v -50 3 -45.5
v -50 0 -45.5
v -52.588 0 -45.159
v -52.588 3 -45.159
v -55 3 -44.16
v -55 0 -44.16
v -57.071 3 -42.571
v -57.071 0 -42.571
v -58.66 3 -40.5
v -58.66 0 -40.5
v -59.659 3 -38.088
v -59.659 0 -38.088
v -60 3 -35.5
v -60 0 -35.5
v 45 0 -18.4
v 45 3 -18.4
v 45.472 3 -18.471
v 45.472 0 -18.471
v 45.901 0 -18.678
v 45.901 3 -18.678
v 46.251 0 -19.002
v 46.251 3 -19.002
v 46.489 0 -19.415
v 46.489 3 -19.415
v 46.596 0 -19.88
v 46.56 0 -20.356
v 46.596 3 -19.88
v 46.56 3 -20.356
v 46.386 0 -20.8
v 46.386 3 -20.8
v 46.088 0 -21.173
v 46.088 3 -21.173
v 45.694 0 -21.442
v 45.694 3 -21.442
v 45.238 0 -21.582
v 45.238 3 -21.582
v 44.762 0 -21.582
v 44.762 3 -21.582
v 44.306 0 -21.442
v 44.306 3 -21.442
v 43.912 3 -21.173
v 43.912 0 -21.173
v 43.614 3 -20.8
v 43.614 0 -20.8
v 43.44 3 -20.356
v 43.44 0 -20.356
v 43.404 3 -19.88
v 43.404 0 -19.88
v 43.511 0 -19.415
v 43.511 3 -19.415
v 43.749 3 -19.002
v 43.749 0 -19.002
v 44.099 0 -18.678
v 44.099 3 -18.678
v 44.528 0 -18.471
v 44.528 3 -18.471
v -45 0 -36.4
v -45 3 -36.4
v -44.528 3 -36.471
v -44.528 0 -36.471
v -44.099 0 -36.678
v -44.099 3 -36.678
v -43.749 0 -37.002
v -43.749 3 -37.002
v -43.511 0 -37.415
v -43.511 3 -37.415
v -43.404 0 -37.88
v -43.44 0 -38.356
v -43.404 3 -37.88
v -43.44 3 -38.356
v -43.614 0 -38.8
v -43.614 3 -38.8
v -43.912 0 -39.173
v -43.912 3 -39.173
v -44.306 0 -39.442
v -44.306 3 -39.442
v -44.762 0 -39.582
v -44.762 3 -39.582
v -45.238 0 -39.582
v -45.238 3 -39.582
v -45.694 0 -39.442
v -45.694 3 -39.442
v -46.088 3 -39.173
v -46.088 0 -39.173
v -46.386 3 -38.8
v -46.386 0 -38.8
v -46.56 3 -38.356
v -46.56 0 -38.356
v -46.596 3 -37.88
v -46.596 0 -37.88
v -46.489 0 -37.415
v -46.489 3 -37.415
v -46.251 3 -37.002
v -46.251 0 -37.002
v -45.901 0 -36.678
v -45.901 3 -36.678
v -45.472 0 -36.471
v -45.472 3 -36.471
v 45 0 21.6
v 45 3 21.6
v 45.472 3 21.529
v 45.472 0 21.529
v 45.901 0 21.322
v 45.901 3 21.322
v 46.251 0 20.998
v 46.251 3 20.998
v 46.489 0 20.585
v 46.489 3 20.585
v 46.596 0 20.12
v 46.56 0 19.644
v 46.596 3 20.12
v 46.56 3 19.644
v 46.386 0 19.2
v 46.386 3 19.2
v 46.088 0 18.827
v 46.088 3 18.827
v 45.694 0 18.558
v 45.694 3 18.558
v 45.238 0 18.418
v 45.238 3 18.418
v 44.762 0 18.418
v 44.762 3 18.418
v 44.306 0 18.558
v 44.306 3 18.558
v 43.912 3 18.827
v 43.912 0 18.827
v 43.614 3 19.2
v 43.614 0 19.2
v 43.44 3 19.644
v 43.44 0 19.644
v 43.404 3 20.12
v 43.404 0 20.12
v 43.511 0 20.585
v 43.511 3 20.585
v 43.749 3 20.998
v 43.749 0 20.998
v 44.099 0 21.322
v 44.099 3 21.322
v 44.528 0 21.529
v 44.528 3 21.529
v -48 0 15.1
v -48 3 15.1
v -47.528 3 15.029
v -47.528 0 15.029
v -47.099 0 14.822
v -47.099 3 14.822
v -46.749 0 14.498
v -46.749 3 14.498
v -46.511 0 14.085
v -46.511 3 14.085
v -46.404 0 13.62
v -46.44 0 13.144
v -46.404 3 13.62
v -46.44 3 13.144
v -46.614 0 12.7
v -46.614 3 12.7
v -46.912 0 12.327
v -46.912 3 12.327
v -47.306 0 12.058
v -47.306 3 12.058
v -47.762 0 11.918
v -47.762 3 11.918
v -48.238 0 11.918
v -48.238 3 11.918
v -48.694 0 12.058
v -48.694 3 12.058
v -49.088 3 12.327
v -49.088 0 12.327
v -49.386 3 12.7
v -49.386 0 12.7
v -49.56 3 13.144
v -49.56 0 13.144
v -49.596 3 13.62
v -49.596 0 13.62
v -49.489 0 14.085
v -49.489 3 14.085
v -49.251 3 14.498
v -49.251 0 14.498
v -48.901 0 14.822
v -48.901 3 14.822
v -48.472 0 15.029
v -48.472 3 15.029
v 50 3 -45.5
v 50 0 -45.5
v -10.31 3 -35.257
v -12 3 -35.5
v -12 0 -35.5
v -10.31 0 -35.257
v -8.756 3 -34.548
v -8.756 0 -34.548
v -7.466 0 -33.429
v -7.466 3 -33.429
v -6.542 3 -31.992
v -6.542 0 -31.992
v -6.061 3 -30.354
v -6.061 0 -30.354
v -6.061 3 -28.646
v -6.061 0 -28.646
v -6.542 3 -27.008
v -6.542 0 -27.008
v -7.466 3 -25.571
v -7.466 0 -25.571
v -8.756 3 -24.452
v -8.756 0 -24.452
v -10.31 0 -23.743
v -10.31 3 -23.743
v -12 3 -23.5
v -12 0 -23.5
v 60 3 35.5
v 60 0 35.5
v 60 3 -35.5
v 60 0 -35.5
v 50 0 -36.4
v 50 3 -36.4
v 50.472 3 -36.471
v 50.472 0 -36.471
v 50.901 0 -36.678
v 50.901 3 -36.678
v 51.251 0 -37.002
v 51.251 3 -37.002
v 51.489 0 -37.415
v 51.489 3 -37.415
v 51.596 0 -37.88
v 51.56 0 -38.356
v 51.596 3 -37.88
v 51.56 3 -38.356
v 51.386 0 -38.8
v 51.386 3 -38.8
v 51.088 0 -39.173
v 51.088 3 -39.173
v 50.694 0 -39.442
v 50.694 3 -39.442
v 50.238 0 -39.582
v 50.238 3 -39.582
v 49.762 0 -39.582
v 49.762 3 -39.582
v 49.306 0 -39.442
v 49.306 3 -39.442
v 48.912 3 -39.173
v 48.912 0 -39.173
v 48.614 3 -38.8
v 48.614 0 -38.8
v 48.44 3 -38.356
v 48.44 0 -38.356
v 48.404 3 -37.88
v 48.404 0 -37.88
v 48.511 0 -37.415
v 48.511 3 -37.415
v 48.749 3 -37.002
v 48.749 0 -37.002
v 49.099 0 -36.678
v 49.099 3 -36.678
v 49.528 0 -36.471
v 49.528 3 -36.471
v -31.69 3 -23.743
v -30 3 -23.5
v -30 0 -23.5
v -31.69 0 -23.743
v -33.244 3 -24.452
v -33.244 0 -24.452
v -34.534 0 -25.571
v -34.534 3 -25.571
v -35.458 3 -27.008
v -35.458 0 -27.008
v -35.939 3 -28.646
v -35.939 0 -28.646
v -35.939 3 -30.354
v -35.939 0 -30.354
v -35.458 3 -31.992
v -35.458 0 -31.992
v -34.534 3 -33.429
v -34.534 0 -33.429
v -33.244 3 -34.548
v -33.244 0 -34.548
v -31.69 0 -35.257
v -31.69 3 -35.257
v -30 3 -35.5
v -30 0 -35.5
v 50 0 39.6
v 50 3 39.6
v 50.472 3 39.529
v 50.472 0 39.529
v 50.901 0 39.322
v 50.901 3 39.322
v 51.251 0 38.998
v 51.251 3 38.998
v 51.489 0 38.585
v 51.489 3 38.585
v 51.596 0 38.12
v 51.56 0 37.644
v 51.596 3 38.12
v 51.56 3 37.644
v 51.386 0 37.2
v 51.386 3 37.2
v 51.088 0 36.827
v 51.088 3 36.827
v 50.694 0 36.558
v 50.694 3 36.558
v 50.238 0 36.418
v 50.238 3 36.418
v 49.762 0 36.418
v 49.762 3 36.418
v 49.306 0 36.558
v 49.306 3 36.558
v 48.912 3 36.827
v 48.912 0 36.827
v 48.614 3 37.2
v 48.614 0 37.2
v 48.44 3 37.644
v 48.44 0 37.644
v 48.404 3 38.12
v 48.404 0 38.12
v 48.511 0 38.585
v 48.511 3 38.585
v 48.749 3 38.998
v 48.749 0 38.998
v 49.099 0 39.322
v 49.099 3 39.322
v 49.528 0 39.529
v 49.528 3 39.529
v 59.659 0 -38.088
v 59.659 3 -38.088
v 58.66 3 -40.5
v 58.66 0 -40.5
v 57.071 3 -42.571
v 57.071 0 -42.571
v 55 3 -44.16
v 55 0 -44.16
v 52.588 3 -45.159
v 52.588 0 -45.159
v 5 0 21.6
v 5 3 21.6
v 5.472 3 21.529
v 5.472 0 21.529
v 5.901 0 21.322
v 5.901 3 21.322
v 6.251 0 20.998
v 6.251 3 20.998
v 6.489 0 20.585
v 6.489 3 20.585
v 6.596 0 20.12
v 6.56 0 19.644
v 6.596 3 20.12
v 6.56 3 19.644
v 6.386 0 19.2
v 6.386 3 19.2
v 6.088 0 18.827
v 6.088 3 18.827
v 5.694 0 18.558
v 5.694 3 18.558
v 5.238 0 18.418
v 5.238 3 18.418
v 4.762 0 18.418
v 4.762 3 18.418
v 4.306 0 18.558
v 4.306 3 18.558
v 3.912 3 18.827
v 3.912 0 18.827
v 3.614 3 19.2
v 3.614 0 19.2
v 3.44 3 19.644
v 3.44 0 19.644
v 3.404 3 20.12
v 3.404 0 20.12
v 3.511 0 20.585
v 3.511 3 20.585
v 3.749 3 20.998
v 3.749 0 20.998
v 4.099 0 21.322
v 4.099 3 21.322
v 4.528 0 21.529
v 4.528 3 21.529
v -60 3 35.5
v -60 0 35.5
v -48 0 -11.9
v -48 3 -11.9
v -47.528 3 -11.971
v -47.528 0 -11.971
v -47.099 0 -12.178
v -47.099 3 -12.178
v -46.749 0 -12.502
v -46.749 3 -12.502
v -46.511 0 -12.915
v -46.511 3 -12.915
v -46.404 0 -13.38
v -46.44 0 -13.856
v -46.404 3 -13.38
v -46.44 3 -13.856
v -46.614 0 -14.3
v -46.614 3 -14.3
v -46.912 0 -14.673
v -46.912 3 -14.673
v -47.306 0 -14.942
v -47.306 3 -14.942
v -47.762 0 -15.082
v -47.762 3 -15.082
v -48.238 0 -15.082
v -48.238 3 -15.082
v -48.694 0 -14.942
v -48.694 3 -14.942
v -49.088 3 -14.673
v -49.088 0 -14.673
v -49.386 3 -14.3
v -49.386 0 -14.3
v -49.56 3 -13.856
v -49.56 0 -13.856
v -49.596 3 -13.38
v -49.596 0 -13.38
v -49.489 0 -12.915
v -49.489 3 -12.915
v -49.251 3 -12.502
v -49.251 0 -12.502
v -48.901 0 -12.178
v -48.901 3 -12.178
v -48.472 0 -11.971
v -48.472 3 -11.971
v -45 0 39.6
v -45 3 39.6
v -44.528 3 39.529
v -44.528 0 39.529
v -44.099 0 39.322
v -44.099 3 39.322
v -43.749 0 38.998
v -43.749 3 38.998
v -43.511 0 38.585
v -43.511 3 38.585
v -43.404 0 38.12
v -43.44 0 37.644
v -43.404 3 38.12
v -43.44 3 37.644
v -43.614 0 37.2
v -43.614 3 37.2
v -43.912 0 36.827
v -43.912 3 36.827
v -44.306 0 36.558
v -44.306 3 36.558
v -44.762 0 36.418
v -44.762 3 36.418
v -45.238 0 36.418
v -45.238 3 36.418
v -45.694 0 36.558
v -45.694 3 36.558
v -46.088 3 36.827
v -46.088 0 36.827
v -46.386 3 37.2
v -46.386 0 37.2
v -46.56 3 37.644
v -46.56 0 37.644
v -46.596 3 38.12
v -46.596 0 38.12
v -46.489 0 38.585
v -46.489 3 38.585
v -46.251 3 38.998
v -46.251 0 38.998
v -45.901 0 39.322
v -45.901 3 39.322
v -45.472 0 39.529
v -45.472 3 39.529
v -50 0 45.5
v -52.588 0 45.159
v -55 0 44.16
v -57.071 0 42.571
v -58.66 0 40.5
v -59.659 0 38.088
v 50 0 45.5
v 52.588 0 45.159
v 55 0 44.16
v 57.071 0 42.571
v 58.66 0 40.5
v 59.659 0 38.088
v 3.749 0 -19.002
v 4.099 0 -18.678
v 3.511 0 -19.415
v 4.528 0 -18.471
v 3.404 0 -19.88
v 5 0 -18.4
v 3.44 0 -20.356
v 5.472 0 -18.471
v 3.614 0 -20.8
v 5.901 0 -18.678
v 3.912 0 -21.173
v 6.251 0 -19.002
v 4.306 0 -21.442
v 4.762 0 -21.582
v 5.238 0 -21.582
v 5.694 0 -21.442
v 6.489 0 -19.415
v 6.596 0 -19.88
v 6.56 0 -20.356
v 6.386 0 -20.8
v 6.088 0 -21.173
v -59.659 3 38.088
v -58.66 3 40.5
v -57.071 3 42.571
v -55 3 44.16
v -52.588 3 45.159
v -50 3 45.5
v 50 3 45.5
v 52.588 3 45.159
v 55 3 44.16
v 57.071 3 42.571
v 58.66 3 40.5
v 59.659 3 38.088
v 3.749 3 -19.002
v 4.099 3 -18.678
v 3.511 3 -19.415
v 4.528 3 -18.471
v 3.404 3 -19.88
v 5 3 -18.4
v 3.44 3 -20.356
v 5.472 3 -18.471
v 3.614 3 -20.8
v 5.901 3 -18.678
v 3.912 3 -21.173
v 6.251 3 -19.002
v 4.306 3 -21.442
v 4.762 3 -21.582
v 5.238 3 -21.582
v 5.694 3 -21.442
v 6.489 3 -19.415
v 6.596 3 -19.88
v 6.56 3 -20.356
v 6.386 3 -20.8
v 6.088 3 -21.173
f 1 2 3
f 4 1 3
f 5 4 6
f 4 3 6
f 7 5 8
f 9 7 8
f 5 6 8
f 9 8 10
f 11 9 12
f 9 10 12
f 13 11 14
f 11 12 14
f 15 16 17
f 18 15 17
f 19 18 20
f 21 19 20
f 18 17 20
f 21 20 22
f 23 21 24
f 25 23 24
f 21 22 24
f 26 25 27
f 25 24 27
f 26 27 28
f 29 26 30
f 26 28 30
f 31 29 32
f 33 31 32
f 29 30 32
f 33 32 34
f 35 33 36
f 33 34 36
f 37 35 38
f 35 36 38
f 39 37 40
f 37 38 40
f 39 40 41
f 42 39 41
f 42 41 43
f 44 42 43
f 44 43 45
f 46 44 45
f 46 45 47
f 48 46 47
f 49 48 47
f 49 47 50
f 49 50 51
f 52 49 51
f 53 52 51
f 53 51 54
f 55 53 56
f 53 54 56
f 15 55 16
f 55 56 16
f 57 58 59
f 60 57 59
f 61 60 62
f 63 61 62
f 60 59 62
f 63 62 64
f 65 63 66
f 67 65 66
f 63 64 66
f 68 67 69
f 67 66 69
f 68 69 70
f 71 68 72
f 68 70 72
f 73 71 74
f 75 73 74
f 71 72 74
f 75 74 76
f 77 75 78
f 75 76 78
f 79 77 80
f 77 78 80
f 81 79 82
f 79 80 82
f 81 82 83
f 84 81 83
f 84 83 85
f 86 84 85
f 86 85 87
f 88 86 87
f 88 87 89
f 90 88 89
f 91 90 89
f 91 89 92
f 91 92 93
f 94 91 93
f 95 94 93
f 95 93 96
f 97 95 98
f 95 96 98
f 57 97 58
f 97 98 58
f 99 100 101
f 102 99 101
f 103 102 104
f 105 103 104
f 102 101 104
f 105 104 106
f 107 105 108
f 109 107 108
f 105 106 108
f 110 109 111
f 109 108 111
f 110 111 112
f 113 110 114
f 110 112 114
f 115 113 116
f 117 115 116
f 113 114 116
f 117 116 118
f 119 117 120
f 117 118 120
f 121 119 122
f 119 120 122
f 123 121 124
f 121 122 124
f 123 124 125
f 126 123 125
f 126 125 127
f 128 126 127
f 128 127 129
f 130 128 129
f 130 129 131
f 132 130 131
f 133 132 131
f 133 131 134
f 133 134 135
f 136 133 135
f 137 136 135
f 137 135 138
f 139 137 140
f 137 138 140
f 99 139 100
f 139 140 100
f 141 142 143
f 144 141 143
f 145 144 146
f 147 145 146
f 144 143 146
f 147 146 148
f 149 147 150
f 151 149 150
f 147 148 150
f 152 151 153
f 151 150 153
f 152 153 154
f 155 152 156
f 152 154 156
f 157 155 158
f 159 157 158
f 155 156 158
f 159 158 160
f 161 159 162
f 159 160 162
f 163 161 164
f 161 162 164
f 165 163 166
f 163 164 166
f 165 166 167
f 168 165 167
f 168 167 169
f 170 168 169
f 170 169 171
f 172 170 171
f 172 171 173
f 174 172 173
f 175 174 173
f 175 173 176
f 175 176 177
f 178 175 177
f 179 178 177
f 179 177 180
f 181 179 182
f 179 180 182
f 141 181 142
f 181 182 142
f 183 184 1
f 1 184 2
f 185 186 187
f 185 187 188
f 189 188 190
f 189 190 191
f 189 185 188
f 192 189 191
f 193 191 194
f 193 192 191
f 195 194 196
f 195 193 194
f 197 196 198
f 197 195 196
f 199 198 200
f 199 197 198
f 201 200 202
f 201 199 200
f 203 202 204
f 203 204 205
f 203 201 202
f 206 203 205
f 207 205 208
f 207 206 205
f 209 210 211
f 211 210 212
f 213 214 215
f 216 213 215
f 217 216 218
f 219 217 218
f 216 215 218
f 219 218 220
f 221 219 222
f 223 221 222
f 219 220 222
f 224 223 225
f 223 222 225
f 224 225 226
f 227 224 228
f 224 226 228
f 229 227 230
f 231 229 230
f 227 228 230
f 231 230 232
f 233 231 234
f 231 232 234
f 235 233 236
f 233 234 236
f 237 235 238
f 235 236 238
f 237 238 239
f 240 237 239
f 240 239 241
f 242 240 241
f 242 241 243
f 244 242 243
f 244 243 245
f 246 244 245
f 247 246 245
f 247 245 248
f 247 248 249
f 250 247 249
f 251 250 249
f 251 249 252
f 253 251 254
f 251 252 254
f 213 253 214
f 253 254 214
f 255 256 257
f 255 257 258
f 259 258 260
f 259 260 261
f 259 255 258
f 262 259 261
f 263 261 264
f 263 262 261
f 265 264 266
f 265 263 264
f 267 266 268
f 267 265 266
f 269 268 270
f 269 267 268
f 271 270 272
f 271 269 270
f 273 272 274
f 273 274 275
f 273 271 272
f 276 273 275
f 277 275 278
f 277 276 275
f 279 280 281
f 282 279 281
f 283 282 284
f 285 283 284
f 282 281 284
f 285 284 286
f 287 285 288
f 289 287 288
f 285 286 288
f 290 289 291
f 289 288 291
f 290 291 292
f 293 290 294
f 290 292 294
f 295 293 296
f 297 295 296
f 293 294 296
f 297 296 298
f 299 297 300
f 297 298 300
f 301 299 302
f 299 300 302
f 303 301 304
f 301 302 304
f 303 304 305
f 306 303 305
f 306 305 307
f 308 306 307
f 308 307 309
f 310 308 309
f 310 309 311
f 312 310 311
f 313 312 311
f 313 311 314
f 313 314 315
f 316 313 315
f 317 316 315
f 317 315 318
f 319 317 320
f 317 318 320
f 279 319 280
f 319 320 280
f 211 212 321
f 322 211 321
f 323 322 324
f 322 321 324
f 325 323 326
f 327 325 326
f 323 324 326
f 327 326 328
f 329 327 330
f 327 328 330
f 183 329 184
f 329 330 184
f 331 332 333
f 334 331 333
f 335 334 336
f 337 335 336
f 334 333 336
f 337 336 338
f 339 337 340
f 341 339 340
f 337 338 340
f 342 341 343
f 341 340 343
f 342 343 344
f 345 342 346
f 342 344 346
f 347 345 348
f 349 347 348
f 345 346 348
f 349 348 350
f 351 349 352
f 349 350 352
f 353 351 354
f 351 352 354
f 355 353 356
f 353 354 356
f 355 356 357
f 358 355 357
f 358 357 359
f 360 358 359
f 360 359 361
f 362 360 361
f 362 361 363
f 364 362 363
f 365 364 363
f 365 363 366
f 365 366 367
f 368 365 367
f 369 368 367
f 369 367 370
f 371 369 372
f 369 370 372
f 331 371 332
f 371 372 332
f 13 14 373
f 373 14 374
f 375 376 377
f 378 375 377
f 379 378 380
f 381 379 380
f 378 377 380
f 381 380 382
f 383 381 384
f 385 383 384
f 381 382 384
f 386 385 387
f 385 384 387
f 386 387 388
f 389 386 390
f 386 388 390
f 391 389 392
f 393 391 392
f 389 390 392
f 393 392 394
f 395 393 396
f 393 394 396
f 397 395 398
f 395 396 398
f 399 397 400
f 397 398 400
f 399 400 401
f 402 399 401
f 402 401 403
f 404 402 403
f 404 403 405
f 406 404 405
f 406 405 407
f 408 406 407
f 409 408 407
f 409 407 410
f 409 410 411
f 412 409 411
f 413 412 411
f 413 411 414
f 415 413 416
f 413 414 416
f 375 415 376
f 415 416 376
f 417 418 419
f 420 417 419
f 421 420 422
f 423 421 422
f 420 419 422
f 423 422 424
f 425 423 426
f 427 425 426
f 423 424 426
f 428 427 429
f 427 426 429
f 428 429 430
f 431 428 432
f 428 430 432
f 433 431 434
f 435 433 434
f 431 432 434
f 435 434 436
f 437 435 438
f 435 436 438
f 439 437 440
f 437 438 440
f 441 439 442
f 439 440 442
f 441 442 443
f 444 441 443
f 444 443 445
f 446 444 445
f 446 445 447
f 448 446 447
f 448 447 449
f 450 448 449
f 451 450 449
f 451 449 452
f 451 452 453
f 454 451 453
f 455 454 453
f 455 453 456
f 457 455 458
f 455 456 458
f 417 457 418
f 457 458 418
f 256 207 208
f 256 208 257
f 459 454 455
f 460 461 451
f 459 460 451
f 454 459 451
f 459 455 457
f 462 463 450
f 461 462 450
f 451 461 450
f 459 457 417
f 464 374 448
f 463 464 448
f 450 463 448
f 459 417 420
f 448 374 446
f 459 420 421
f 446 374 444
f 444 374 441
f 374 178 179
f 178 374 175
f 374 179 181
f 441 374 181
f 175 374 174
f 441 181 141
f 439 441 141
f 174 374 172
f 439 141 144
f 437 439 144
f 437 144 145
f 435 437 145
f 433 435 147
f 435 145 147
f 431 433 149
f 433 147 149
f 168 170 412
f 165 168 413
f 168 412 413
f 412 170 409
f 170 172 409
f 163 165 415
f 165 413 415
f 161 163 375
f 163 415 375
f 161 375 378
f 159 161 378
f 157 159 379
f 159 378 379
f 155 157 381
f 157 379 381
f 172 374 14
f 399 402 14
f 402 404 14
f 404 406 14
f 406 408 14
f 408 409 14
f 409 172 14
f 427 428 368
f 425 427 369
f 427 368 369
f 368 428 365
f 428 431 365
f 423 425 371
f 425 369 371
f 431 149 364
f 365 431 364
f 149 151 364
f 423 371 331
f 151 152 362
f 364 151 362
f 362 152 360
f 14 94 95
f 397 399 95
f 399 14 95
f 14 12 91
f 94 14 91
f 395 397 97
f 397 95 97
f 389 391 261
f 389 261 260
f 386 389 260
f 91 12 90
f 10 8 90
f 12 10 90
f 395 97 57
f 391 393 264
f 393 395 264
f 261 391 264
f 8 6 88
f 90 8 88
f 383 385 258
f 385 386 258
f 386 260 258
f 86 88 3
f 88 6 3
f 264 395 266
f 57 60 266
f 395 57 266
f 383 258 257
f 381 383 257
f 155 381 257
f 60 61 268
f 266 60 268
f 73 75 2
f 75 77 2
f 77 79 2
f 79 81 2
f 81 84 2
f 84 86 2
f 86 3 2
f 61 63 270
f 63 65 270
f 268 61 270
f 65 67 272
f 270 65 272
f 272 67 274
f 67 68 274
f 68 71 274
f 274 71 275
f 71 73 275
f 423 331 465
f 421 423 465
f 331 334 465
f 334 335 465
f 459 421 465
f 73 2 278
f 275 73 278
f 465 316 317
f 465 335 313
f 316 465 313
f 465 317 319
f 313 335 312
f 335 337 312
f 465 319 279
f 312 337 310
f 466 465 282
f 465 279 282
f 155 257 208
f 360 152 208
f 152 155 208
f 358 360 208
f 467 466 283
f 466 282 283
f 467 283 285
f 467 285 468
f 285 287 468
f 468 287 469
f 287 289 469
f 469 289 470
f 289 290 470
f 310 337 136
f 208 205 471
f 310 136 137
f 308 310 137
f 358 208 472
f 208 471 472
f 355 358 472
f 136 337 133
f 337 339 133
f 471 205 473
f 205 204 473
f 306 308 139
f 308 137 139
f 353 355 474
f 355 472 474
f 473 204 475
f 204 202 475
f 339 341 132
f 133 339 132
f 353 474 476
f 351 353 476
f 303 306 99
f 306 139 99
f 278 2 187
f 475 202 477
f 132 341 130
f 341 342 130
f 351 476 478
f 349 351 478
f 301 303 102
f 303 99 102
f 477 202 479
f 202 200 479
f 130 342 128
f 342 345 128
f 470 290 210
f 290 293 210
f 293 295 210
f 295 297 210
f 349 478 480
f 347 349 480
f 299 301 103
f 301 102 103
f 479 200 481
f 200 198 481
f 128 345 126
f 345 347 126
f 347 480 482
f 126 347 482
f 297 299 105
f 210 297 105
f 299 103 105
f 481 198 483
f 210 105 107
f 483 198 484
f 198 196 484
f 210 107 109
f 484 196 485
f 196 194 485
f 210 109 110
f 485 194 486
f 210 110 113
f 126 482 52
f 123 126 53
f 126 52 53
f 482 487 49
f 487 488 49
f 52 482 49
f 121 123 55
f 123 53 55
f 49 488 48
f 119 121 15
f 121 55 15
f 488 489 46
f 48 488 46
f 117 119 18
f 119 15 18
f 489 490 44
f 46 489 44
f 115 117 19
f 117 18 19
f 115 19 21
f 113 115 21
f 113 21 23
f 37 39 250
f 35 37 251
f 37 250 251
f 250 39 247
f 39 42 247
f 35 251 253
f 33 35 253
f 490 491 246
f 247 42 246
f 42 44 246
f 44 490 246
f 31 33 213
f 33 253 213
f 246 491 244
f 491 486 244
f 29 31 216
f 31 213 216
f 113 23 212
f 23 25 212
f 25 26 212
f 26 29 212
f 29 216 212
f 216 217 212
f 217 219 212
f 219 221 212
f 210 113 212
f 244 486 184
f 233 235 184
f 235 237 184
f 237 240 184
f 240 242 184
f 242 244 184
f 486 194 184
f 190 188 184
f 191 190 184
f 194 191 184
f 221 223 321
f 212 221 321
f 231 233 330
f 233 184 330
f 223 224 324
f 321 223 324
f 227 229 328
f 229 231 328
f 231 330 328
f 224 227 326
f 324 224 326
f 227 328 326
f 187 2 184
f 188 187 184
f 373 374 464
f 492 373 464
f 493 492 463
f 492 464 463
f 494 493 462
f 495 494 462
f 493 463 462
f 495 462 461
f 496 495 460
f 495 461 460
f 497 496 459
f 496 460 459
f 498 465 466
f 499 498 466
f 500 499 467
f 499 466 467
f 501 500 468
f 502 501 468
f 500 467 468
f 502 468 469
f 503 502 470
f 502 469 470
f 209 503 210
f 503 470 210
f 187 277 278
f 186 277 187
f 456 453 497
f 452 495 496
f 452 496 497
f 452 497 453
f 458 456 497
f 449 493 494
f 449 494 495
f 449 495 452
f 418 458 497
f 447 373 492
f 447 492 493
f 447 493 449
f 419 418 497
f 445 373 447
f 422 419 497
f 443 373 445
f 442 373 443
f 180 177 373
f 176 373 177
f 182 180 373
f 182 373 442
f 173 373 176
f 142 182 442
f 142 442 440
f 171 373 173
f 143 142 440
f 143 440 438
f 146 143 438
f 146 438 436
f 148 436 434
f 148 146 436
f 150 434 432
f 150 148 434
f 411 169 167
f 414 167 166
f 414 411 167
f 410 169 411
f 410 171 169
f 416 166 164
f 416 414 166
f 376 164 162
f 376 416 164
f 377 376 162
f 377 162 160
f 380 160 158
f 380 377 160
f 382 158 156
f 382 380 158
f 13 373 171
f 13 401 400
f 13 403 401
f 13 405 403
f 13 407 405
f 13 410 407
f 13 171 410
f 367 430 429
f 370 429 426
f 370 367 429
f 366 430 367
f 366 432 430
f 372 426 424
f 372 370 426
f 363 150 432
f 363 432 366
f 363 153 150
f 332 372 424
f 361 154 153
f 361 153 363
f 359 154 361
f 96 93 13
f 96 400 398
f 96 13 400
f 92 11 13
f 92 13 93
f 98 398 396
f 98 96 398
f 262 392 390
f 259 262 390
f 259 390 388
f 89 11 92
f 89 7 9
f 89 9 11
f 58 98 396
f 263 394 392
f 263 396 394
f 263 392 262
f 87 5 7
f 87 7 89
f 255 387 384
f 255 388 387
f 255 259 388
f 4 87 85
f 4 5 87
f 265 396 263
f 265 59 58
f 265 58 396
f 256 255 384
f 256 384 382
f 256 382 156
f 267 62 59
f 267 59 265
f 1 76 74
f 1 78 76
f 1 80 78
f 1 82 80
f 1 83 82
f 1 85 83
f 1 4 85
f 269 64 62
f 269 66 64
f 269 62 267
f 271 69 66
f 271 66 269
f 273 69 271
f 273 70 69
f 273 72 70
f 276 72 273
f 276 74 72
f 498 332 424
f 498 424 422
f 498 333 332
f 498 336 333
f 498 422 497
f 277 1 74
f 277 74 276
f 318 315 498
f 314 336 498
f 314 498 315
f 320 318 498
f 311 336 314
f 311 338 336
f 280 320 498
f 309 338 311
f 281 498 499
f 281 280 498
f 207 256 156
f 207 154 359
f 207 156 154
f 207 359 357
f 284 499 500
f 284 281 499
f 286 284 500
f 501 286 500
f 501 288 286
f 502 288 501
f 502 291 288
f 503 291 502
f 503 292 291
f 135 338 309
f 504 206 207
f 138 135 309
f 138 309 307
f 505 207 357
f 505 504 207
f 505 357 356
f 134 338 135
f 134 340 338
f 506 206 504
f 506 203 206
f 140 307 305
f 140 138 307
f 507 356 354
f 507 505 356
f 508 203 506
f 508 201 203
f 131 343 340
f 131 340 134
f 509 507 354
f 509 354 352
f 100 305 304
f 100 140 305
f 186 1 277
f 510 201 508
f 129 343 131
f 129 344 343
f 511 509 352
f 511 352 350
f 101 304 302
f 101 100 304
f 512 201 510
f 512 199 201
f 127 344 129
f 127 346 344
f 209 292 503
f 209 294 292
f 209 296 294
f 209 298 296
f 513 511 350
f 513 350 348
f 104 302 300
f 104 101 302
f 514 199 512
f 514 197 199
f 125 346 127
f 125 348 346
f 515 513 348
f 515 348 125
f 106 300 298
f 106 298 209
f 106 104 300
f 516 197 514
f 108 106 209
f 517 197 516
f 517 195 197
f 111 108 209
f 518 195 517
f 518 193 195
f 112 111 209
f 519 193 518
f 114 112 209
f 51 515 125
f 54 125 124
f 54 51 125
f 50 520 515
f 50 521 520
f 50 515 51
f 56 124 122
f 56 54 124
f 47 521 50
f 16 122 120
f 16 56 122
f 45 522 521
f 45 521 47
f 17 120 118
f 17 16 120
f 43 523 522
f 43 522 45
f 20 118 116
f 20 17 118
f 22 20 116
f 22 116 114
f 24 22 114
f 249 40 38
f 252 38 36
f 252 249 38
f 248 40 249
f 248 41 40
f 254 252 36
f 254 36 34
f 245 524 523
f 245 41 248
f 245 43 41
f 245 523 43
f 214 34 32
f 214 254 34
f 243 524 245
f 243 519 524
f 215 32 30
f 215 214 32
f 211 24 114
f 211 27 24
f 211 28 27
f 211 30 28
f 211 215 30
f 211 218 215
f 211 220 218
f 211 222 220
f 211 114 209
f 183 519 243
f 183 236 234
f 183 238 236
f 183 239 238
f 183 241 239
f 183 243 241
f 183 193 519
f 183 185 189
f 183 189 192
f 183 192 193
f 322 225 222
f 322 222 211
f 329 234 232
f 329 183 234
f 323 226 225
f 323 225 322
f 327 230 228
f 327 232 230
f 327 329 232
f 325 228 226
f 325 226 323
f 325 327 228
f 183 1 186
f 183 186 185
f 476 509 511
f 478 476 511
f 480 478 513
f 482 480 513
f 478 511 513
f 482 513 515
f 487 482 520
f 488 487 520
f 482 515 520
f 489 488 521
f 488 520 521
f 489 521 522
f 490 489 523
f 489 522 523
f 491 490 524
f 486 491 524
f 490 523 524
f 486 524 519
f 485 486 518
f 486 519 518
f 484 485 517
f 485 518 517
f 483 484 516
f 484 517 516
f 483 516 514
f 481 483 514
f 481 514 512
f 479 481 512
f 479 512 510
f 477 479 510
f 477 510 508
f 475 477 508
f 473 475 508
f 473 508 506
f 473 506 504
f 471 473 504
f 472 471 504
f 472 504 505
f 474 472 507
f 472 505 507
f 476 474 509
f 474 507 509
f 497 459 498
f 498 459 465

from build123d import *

# Parameters (mm, degrees)
Y_KSEKLIK_EKSTR_ZYON1_DEPTH = 3
IZIM2_R                     = 1.6
KES_EKSTR_ZYON1_DEPTH       = 3
IZIM3_R                     = 1.6
KES_EKSTR_ZYON2_DEPTH       = 3
KES_EKSTR_ZYON3_DEPTH       = 3
IZIM5_R                     = 1.6
KES_EKSTR_ZYON4_DEPTH       = 3


with BuildPart() as part:
    # Çizim1 → Yükseklik-Ekstrüzyon1 (new body)
    with BuildSketch(Plane(origin=(0, 0, 0), x_dir=(1, 0, 0), z_dir=(0, 1, 0))):
        with BuildLine():
            Line((-50, -45.5), (50, -45.5))
            ThreePointArc((50, -45.5), (57.071067812, -42.571067812), (60, -35.5))
            Line((60, -35.5), (60, 35.5))
            ThreePointArc((60, 35.5), (57.071067812, 42.571067812), (50, 45.5))
            Line((50, 45.5), (-50, 45.5))
            ThreePointArc((-50, 45.5), (-57.071067812, 42.571067812), (-60, 35.5))
            Line((-60, 35.5), (-60, -35.5))
            ThreePointArc((-60, -35.5), (-57.071067812, -42.571067812), (-50, -45.5))
        make_face()
    extrude(amount=Y_KSEKLIK_EKSTR_ZYON1_DEPTH)

    # Çizim2 → Kes-Ekstrüzyon1 (cut)
    with BuildSketch(Plane(origin=(0, 3, 0), x_dir=(1, 0, 0), z_dir=(0, 1, 0))):
        with Locations(Location((50, -38, 0), (0, 0, 270))):
            Circle(IZIM2_R)
        with Locations(Location((50, 38, 0), (0, 0, 270))):
            Circle(IZIM2_R)
        with Locations(Location((-45, 38, 0), (0, 0, 270))):
            Circle(IZIM2_R)
        with Locations(Location((-45, -38, 0), (0, 0, 270))):
            Circle(IZIM2_R)
    extrude(amount=-KES_EKSTR_ZYON1_DEPTH, mode=Mode.SUBTRACT)

    # Çizim3 → Kes-Ekstrüzyon2 (cut)
    with BuildSketch(Plane(origin=(0, 3, 0), x_dir=(1, 0, 0), z_dir=(0, 1, 0))):
        with Locations(Location((45, 20, 0), (0, 0, 270))):
            Circle(IZIM3_R)
        with Locations(Location((45, -20, 0), (0, 0, 270))):
            Circle(IZIM3_R)
        with Locations(Location((5, 20, 0), (0, 0, 270))):
            Circle(IZIM3_R)
        with Locations(Location((5, -20, 0), (0, 0, 270))):
            Circle(IZIM3_R)
    extrude(amount=-KES_EKSTR_ZYON2_DEPTH, mode=Mode.SUBTRACT)

    # Çizim4 → Kes-Ekstrüzyon3 (cut)
    with BuildSketch(Plane(origin=(0, 3, 0), x_dir=(1, 0, 0), z_dir=(0, 1, 0))):
        with BuildLine():
            Line((-30, 35.5), (-12, 35.5))
            ThreePointArc((-12, 35.5), (-6, 29.5), (-12, 23.5))
            Line((-12, 23.5), (-30, 23.5))
            ThreePointArc((-30, 23.5), (-36, 29.5), (-30, 35.5))
        make_face()
    extrude(amount=-KES_EKSTR_ZYON3_DEPTH, mode=Mode.SUBTRACT)

    # Çizim5 → Kes-Ekstrüzyon4 (cut)
    with BuildSketch(Plane(origin=(0, 3, 0), x_dir=(1, 0, 0), z_dir=(0, 1, 0))):
        with Locations(Location((-48, 13.5, 0), (0, 0, 270))):
            Circle(IZIM5_R)
        with Locations(Location((-48, -13.5, 0), (0, 0, 270))):
            Circle(IZIM5_R)
    extrude(amount=-KES_EKSTR_ZYON4_DEPTH, mode=Mode.SUBTRACT)


solid = part.part
